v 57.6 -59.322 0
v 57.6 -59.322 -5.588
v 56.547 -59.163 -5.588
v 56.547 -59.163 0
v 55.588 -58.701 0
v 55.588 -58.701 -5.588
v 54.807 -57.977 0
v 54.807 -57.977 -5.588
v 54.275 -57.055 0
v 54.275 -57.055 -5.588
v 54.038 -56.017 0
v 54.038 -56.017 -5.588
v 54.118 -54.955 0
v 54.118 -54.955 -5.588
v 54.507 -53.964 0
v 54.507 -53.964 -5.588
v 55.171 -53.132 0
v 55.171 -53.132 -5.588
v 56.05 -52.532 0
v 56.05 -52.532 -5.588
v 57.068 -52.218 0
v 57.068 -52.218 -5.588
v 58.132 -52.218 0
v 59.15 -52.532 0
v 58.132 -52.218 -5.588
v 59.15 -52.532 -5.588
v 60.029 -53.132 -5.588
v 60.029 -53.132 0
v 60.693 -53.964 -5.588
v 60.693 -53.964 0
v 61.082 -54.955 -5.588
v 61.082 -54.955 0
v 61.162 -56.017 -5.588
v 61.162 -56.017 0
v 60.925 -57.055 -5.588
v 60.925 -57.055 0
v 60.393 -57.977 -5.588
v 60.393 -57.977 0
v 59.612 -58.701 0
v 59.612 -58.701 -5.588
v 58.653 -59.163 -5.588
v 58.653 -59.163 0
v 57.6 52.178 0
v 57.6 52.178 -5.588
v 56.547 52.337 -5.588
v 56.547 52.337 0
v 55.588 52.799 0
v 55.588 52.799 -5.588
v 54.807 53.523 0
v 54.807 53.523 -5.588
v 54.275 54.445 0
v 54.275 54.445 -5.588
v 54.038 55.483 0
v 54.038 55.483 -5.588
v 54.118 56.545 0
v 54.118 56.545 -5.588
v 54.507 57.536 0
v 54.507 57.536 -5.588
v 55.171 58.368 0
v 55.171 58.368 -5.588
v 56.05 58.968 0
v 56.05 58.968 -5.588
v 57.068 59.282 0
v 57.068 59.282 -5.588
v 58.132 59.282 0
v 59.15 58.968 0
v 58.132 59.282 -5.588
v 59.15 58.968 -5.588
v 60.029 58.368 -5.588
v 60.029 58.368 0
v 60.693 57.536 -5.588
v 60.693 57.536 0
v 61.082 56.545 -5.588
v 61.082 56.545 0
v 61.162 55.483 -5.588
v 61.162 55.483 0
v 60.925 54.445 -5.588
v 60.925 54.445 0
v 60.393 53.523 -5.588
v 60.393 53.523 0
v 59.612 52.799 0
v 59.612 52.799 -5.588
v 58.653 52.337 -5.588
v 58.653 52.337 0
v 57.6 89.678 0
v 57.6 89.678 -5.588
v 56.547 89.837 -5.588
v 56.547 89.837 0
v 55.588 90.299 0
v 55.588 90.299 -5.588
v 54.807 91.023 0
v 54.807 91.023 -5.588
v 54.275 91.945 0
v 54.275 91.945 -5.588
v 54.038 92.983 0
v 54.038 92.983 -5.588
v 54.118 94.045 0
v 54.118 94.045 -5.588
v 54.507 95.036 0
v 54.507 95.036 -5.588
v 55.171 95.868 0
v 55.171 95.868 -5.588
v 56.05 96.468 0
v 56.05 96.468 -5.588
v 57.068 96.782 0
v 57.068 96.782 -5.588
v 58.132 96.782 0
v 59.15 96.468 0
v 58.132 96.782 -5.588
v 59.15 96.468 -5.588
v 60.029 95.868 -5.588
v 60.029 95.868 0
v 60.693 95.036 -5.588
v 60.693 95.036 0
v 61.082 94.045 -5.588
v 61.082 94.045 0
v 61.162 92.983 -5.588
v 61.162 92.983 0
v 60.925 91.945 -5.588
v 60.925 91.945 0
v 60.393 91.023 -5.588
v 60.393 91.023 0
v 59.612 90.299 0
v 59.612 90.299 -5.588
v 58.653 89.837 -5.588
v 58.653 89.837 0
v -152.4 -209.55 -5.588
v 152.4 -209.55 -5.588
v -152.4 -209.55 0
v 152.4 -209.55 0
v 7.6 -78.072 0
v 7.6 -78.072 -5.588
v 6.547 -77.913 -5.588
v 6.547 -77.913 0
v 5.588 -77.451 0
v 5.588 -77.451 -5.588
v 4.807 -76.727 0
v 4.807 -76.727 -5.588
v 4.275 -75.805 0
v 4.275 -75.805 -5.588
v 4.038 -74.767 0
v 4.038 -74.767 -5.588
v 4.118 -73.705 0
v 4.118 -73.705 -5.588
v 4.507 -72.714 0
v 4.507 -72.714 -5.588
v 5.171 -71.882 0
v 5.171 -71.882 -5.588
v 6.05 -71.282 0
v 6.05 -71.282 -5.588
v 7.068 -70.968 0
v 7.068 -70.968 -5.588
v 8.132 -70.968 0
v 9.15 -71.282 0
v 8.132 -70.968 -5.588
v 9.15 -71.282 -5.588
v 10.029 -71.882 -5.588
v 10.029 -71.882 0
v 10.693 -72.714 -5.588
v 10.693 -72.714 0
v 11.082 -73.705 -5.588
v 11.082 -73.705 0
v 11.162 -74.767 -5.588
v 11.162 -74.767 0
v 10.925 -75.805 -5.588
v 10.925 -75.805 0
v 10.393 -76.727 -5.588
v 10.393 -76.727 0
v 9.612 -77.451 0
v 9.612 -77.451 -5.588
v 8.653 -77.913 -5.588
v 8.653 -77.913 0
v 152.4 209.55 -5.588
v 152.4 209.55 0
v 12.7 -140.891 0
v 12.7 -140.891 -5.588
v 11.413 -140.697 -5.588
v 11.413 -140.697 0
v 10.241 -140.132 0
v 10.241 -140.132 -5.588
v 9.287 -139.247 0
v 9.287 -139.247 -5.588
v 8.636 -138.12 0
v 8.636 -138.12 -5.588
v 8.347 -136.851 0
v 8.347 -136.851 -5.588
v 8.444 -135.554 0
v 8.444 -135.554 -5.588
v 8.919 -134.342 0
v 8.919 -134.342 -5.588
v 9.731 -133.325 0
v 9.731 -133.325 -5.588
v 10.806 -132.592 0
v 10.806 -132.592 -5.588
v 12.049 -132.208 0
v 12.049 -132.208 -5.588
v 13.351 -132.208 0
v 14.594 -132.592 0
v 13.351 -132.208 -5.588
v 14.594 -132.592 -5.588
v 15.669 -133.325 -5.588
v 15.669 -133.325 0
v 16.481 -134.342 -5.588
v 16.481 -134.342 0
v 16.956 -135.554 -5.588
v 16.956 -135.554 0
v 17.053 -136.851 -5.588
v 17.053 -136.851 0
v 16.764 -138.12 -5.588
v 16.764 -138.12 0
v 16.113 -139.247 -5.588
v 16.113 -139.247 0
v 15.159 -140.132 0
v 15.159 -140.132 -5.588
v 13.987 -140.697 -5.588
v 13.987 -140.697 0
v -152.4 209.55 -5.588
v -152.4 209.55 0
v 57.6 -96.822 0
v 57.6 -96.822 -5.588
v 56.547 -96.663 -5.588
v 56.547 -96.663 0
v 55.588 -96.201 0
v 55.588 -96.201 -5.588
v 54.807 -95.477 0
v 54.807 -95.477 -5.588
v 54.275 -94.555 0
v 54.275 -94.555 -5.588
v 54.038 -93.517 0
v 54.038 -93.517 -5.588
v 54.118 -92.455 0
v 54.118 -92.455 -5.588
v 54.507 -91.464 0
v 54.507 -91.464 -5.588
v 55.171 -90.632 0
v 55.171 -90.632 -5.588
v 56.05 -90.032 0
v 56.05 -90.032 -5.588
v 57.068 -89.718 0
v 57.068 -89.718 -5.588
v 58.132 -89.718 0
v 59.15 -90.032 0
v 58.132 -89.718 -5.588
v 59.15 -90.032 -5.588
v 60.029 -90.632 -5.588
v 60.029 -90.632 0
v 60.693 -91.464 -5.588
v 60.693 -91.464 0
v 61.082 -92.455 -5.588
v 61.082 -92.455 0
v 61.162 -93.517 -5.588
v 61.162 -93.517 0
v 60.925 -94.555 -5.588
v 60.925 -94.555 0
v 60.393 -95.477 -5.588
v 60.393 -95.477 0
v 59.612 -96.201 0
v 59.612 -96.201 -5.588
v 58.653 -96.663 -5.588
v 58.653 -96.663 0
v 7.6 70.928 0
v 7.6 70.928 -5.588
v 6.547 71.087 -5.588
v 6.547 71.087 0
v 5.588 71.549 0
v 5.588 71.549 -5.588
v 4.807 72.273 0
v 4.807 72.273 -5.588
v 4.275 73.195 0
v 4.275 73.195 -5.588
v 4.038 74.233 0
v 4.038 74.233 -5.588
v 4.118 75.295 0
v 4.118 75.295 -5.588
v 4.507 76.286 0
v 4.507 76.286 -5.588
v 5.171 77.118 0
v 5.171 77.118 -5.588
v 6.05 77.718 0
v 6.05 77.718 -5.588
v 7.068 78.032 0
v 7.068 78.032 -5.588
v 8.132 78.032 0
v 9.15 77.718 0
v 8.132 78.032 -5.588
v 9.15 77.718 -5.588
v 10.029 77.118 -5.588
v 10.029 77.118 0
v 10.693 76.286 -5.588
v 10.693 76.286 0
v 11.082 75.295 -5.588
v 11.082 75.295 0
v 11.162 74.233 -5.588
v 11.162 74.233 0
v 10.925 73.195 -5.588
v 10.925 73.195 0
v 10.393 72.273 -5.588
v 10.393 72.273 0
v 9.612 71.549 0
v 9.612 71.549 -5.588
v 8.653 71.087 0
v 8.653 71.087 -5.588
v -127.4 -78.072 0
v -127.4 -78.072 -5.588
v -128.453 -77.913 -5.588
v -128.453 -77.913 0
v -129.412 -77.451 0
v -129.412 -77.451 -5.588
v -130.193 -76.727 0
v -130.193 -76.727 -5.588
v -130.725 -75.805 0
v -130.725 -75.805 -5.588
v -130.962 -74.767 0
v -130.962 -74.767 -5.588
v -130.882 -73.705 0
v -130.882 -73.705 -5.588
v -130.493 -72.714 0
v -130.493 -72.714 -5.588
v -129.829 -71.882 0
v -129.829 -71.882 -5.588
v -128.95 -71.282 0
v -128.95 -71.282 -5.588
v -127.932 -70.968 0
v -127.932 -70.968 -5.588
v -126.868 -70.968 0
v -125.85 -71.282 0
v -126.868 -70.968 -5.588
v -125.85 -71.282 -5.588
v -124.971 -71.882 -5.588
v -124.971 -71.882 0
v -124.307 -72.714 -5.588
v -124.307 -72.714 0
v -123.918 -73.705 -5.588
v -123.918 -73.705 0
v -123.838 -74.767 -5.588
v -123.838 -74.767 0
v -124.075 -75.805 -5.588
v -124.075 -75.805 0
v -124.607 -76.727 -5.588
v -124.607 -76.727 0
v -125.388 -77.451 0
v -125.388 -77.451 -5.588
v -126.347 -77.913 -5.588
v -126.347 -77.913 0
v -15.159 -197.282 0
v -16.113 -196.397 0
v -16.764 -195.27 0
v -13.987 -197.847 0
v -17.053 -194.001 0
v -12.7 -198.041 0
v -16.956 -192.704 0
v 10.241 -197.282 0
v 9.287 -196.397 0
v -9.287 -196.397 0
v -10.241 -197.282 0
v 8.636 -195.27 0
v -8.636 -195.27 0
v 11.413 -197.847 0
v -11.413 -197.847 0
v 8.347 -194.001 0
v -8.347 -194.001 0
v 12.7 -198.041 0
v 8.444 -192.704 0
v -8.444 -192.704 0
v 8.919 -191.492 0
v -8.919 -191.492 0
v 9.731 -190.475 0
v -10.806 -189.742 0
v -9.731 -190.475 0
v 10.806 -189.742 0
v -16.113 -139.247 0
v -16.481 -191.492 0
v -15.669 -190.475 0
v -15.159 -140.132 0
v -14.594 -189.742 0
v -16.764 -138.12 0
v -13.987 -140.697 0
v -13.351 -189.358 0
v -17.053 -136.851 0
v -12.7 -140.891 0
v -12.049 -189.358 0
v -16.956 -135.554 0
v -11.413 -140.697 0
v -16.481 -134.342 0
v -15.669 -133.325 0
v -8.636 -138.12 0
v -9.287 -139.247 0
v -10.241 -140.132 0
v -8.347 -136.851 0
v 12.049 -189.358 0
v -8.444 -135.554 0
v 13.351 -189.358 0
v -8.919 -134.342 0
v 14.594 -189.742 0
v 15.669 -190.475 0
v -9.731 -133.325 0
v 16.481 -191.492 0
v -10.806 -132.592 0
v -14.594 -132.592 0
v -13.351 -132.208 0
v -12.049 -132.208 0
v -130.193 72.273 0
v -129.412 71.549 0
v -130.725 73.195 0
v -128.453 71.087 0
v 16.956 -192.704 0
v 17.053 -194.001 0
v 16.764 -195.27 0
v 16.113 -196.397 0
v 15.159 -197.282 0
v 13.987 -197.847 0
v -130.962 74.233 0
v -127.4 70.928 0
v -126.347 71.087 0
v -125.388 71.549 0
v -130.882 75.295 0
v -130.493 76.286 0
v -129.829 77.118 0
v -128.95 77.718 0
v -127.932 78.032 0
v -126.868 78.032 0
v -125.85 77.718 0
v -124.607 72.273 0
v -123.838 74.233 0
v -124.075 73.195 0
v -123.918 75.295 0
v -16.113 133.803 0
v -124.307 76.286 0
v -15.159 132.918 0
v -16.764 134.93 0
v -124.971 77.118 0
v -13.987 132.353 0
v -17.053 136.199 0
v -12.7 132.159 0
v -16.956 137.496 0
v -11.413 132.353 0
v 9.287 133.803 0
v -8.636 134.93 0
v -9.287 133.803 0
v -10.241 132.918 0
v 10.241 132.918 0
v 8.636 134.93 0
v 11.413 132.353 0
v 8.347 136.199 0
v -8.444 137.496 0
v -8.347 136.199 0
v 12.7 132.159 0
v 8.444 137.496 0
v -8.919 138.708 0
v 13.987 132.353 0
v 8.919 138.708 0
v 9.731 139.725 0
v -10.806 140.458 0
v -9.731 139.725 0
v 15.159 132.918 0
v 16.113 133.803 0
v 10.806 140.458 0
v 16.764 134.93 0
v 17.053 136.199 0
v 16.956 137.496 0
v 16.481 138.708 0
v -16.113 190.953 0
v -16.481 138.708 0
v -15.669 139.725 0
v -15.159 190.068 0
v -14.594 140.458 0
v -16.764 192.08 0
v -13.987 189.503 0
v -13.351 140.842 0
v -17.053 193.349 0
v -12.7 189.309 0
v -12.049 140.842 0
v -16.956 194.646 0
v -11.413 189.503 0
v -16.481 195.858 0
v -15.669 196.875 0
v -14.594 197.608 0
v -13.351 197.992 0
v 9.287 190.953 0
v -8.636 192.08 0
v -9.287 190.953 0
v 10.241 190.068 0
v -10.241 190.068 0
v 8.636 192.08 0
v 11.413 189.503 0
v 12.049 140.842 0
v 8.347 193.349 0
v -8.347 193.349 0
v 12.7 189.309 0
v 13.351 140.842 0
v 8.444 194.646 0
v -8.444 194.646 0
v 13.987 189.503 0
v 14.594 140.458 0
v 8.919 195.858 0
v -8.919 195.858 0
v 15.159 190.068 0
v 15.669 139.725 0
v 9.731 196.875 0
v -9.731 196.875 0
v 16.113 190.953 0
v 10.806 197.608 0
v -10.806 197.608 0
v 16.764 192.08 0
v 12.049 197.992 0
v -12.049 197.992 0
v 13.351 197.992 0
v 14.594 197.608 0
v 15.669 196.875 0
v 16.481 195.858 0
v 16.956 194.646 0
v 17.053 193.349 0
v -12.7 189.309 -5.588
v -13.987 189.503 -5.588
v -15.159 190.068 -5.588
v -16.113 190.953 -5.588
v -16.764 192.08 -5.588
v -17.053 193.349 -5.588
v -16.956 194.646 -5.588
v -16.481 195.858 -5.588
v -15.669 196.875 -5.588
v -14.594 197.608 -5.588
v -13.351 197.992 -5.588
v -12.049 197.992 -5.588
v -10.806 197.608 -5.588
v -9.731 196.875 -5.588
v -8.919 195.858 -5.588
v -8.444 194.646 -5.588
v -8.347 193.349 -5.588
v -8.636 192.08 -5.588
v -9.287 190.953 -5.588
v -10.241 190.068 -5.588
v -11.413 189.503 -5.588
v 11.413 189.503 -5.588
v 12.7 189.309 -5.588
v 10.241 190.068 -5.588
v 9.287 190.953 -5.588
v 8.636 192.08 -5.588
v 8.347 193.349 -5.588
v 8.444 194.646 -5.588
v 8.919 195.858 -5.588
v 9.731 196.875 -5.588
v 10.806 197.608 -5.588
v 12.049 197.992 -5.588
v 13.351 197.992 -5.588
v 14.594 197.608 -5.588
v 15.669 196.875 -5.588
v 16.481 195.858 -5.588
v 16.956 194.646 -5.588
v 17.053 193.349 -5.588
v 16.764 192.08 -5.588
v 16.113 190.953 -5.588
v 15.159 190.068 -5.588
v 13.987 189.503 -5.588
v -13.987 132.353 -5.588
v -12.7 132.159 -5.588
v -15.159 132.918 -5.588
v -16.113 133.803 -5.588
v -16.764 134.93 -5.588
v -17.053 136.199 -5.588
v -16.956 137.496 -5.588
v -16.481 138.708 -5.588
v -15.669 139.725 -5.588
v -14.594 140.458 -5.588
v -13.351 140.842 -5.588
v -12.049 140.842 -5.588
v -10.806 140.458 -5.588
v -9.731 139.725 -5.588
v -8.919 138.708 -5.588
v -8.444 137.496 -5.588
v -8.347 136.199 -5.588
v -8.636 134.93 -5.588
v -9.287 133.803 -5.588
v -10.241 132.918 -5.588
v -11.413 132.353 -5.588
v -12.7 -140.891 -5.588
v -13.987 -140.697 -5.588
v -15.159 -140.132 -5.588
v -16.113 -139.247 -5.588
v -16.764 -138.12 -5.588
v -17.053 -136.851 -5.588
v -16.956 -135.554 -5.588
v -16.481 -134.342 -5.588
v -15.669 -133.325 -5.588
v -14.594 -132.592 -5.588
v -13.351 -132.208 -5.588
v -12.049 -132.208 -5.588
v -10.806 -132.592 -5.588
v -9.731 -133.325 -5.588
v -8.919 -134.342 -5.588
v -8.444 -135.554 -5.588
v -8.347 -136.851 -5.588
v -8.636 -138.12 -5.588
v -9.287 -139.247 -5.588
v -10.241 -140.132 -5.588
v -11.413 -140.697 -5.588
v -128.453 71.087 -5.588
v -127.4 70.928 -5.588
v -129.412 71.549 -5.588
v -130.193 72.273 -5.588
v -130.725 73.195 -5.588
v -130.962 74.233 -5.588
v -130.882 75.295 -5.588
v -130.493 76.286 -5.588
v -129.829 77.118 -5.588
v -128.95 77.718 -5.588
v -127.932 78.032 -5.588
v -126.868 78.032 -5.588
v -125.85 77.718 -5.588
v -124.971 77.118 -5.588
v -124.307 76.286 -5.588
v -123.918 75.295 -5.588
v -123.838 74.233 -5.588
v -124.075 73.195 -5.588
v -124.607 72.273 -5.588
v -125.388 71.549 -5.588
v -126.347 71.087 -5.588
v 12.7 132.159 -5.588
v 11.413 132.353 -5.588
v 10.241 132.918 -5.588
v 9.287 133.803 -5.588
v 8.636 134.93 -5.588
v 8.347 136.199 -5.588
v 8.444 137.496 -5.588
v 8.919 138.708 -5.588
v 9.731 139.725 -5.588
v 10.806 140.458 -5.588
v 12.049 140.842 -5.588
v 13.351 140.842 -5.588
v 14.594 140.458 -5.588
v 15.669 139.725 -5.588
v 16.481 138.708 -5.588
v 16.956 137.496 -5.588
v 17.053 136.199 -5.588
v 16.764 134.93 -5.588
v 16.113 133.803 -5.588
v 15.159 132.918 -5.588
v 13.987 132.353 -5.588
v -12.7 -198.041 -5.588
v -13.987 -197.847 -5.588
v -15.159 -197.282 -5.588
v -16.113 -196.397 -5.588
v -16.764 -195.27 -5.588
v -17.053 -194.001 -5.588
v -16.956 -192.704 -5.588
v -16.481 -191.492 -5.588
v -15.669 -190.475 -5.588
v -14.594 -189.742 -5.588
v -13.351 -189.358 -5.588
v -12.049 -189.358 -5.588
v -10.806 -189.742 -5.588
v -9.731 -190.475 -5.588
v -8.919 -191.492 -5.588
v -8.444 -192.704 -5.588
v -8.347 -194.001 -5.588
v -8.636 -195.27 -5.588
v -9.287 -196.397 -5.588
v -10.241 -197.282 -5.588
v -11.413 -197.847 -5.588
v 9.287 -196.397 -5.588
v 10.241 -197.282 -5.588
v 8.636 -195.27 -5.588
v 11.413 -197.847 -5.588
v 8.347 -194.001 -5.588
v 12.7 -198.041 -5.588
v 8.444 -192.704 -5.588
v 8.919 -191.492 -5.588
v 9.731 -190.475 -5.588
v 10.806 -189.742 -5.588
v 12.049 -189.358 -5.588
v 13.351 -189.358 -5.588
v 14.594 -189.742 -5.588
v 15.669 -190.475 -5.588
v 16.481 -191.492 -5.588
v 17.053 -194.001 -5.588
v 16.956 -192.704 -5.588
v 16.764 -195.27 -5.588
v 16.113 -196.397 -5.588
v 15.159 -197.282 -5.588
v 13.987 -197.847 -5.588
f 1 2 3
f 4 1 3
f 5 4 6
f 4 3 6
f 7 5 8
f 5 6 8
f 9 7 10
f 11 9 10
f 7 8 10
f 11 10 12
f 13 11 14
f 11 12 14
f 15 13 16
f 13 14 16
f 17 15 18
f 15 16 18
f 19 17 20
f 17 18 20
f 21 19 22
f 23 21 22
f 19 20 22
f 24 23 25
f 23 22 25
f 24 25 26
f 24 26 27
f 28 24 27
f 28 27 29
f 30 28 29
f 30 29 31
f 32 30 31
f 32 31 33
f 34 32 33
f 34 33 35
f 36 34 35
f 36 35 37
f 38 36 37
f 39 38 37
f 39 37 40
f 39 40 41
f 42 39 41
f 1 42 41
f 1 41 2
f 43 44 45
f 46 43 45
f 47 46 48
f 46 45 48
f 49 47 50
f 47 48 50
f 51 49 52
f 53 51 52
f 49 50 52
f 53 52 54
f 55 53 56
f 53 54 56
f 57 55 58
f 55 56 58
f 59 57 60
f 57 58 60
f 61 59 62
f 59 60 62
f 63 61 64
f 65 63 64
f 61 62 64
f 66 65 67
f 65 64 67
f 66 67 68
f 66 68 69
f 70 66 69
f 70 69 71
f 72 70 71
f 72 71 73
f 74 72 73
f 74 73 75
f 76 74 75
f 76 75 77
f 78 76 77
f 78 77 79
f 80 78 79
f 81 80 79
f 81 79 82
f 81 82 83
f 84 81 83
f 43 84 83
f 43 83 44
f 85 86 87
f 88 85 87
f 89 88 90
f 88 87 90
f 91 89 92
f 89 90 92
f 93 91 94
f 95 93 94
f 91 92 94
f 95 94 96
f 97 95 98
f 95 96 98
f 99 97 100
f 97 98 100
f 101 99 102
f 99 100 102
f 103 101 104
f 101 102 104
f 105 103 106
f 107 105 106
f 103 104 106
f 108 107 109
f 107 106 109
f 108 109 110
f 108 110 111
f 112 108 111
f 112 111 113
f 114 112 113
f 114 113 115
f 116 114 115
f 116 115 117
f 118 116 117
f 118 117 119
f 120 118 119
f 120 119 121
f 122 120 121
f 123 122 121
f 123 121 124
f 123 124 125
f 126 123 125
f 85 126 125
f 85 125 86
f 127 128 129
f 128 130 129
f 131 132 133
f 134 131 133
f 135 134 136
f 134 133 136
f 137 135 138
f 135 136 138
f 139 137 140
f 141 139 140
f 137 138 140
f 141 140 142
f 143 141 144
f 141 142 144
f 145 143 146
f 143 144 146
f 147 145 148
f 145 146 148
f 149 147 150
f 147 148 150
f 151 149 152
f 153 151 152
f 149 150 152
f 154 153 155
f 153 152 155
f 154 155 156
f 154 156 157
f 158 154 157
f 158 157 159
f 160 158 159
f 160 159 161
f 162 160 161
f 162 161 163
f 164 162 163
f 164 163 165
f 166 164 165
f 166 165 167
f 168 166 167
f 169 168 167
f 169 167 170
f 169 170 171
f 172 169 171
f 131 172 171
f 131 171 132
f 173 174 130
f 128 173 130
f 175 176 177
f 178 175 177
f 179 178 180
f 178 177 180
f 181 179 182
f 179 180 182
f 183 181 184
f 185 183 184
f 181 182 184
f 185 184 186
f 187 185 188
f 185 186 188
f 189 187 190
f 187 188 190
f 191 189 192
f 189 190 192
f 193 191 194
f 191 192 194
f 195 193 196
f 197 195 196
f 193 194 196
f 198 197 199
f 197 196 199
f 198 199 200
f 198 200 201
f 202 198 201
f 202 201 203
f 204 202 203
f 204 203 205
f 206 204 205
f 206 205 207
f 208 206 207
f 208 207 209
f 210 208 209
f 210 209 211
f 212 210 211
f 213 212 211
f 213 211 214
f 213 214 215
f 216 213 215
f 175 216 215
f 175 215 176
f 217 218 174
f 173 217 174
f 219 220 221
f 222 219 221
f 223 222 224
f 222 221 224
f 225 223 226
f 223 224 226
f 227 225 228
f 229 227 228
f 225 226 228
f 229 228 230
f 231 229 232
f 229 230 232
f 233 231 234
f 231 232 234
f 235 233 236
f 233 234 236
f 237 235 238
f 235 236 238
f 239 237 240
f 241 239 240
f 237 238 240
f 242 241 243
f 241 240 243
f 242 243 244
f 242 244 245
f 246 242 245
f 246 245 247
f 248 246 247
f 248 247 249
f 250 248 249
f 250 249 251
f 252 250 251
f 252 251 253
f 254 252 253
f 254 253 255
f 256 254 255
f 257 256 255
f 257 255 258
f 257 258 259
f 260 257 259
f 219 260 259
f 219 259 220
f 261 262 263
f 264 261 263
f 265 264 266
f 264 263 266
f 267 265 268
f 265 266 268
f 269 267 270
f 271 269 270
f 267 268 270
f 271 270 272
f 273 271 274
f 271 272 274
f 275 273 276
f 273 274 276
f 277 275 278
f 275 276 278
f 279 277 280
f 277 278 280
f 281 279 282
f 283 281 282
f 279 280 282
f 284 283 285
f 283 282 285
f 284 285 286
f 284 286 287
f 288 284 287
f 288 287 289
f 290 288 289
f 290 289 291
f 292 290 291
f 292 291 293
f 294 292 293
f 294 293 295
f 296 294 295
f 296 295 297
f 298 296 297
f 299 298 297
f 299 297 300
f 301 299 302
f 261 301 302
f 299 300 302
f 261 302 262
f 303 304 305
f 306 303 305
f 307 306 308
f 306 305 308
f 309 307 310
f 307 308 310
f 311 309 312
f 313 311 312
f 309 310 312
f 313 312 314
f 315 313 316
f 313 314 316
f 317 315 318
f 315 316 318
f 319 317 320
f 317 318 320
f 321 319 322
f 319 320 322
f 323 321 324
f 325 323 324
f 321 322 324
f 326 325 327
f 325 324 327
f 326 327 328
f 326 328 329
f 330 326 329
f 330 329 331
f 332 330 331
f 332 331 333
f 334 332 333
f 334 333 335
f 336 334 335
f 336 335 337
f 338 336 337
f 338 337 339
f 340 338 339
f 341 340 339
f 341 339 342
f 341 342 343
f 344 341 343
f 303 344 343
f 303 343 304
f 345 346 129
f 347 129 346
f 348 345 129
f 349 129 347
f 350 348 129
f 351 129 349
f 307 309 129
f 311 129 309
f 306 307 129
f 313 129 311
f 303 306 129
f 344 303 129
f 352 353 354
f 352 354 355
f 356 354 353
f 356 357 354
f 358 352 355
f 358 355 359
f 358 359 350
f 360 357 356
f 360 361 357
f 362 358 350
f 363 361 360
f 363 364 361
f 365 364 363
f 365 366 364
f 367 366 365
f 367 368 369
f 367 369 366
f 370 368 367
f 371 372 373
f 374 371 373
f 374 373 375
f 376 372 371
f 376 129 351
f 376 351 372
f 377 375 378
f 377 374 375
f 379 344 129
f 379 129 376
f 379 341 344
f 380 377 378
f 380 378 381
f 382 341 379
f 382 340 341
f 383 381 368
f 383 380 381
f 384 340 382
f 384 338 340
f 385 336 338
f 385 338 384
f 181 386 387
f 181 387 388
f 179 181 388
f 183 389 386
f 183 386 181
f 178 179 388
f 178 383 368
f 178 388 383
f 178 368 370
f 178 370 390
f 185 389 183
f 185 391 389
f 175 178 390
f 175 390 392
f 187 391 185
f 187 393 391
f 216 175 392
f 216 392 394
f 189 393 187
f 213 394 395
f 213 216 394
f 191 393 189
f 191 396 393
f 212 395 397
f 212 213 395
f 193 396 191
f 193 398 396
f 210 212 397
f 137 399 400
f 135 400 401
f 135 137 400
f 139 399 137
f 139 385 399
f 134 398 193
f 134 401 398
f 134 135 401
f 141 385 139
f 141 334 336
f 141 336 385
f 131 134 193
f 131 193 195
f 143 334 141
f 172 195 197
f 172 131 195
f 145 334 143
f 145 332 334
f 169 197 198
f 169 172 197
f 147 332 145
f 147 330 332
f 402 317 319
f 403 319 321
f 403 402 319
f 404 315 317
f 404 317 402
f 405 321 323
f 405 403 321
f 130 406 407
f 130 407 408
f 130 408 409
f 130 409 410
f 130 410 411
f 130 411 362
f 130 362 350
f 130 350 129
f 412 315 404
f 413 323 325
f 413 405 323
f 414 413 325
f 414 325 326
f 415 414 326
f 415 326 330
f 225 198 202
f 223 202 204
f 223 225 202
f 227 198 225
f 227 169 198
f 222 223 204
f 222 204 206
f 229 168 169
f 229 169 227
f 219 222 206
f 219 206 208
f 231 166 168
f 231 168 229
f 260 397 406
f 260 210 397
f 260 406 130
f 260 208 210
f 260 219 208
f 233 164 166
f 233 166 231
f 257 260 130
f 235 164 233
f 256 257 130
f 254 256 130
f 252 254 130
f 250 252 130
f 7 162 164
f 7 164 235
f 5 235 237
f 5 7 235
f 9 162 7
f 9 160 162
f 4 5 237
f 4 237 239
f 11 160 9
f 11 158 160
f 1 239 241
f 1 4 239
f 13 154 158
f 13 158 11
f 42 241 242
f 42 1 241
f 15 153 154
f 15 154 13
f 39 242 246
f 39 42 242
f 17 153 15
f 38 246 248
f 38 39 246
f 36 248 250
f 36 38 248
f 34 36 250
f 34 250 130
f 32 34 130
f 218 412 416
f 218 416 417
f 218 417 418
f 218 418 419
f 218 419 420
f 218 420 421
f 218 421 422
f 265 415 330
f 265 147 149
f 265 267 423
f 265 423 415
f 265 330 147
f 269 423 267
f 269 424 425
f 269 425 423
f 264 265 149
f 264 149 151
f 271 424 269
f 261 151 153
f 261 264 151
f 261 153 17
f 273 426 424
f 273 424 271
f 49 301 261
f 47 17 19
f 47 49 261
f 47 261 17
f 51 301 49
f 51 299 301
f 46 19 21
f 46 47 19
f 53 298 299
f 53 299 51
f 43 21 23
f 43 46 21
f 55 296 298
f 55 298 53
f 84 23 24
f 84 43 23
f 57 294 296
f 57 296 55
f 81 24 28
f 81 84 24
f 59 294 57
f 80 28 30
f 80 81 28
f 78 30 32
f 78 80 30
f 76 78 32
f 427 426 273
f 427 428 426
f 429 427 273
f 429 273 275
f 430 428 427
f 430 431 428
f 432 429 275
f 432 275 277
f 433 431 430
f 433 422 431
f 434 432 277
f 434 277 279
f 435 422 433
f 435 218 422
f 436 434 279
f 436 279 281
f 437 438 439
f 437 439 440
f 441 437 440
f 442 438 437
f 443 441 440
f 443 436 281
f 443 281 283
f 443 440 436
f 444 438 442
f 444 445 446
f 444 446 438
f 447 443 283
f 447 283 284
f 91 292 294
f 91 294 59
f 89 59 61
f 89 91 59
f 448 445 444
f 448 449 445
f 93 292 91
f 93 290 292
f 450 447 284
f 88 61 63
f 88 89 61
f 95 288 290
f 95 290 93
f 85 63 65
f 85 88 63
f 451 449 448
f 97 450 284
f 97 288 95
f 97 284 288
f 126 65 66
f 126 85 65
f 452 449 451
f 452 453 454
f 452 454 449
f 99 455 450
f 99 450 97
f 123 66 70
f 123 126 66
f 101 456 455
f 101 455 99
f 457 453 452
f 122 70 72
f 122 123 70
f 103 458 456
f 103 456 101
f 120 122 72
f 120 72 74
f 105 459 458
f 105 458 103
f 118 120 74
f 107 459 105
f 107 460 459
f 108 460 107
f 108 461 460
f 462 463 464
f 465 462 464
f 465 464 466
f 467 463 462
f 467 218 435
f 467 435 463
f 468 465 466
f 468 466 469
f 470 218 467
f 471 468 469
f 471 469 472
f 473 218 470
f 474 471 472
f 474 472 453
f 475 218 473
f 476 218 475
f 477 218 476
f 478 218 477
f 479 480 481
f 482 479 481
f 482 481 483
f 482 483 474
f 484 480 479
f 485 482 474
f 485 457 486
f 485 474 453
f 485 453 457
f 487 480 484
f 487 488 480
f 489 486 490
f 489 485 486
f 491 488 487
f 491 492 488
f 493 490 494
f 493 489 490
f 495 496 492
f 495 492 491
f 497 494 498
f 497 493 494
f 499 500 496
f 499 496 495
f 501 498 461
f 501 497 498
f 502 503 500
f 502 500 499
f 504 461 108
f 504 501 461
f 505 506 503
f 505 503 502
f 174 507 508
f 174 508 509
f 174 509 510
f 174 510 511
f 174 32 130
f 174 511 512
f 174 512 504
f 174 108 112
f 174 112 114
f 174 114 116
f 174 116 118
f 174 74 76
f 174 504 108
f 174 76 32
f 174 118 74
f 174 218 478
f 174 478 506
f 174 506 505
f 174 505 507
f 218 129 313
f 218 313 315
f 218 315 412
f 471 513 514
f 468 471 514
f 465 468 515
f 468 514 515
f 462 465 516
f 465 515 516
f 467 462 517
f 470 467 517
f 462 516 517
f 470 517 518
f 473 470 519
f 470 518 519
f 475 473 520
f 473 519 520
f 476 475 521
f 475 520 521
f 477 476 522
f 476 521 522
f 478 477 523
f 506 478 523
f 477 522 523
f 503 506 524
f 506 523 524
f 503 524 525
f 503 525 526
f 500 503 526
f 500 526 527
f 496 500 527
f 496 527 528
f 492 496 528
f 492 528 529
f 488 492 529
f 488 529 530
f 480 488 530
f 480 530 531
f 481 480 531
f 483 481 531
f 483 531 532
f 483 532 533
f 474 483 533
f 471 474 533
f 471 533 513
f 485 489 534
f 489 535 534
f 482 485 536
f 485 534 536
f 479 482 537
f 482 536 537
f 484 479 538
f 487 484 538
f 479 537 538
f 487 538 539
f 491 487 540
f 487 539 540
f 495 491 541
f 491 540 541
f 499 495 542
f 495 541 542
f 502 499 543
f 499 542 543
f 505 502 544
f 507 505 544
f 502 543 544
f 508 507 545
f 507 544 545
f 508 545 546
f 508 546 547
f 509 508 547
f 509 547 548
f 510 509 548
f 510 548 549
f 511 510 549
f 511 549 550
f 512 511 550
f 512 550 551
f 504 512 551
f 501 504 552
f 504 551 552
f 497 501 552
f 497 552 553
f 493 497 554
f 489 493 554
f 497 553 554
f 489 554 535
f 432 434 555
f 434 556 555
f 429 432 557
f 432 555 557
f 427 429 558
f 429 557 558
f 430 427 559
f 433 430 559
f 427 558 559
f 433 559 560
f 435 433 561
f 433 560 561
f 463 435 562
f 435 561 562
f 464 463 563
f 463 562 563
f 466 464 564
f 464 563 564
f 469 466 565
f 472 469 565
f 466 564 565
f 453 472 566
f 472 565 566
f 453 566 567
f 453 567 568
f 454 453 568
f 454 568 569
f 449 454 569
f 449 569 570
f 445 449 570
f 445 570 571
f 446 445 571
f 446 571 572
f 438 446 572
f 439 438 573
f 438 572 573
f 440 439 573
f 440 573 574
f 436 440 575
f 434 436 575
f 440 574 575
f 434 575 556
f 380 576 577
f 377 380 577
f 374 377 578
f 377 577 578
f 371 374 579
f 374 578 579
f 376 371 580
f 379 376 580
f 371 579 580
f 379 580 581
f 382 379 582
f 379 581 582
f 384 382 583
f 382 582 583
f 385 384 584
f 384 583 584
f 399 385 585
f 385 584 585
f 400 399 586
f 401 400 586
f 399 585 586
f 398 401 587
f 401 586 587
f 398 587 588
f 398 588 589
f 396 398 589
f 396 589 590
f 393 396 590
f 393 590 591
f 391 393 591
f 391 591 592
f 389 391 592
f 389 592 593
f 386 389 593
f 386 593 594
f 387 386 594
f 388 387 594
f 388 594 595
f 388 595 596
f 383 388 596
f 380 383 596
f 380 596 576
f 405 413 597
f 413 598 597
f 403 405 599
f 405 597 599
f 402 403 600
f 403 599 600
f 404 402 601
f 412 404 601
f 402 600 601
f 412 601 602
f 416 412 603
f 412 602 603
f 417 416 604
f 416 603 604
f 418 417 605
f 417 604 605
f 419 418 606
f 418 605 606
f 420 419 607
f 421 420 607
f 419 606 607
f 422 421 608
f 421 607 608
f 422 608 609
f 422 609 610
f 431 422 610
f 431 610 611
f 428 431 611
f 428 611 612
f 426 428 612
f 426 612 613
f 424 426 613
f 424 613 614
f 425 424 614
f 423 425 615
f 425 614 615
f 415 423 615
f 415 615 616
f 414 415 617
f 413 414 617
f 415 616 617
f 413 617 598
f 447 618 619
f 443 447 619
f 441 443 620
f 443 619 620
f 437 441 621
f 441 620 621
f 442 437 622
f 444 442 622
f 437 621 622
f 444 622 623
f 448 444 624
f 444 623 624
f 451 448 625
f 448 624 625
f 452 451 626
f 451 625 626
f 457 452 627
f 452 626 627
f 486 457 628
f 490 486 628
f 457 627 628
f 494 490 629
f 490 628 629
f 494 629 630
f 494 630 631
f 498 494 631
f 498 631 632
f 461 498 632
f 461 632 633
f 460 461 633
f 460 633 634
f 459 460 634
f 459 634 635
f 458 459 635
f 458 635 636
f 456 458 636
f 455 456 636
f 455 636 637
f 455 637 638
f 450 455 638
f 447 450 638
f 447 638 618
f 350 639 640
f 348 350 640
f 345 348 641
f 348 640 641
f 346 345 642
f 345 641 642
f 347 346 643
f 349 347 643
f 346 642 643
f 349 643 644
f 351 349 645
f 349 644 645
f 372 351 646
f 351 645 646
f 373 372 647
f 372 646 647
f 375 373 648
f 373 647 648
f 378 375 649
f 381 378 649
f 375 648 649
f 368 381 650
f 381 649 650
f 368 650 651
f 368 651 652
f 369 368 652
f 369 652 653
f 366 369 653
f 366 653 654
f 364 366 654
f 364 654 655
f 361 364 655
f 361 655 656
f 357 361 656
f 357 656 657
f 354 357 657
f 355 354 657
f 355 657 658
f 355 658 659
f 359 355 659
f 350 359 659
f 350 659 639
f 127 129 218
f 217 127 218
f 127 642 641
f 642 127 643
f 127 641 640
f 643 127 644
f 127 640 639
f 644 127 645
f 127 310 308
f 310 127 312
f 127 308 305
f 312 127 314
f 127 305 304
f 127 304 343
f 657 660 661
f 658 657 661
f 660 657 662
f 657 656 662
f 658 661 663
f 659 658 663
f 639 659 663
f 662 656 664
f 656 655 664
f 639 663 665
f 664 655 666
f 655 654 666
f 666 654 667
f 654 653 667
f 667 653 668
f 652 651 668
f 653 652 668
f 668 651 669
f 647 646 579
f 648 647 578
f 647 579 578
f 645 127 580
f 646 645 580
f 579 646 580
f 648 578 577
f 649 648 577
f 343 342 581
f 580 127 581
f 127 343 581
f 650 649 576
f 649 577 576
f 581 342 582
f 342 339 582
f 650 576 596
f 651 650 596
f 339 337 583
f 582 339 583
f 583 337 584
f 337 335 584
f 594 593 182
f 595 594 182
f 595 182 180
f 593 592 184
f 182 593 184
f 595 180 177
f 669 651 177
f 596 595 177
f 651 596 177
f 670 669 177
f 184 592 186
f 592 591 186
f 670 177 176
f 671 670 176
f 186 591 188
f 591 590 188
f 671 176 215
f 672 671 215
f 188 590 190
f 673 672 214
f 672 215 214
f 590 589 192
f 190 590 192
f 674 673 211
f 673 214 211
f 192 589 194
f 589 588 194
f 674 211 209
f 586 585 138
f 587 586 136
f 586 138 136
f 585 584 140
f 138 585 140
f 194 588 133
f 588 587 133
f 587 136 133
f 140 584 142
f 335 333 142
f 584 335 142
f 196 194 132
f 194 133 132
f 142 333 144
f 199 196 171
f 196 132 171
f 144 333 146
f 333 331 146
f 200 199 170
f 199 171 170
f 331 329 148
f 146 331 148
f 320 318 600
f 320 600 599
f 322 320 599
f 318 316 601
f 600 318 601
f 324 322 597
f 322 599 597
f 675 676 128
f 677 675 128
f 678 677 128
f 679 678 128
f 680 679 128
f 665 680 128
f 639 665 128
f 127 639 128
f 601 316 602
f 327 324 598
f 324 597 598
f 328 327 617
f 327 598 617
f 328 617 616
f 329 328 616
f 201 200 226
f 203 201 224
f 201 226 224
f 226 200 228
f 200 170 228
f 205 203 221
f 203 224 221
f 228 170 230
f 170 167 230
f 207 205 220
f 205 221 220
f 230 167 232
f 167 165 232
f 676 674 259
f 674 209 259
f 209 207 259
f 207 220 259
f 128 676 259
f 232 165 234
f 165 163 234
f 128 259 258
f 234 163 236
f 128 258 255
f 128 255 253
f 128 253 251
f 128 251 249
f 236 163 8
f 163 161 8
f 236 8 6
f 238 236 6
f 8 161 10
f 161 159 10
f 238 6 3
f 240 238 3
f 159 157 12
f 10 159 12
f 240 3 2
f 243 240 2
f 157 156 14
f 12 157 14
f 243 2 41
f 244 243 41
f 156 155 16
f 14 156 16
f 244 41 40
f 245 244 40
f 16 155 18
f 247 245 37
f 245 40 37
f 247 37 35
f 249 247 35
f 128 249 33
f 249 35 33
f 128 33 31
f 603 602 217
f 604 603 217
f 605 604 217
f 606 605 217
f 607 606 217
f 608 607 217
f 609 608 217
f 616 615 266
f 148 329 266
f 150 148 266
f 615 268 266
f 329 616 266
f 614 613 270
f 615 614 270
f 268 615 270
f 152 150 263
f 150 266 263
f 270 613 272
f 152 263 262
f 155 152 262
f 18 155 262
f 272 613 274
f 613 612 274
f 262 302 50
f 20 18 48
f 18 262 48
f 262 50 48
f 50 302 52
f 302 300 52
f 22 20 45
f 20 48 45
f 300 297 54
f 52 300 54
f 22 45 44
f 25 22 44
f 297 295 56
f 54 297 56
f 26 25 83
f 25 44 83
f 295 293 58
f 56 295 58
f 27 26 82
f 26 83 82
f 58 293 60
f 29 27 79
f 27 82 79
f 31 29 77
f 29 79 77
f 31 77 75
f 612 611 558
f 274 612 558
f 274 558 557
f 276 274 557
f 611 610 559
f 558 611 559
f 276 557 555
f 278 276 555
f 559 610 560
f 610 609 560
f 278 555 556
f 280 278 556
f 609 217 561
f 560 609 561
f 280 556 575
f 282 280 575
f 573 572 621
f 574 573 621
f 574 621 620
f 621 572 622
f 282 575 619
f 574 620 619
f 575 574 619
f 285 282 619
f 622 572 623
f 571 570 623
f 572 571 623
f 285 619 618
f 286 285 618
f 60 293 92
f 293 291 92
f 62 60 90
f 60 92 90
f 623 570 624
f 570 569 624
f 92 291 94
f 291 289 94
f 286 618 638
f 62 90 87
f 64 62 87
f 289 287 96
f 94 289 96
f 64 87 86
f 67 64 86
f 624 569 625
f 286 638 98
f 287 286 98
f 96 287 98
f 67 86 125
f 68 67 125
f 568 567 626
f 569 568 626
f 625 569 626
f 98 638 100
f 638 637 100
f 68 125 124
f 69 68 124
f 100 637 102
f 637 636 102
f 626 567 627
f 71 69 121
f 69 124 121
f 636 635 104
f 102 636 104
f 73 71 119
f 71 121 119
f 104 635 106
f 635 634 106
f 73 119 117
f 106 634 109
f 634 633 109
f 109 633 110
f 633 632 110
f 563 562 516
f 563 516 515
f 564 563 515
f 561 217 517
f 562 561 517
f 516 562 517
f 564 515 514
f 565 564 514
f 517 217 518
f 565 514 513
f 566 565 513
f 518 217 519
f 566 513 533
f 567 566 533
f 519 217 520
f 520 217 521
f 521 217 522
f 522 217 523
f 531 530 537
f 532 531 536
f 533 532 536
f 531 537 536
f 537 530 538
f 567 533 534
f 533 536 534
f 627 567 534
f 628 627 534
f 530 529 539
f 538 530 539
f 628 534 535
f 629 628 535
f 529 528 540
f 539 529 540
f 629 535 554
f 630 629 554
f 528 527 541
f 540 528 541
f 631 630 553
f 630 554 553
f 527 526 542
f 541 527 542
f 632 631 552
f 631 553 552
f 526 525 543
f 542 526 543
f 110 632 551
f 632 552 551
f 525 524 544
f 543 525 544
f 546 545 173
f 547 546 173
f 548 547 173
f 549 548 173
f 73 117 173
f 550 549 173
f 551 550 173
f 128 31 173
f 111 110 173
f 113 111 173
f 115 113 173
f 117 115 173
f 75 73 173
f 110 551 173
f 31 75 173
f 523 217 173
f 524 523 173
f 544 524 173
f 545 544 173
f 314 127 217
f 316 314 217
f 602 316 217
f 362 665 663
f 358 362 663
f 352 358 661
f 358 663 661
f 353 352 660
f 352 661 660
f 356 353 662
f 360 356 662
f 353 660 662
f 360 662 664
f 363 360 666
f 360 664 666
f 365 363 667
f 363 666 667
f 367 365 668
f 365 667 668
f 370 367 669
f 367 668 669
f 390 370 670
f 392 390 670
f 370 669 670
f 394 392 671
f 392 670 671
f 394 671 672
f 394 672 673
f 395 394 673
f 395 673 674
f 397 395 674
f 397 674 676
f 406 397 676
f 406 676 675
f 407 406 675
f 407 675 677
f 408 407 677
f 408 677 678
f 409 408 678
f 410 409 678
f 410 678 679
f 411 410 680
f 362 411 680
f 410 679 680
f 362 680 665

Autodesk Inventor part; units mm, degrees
ref_plane "YZ Plane" through (0, 0, 0) normal (1, 0, 0) x (0, 1, 0)
ref_plane "XZ Plane" through (0, 0, 0) normal (0, 1, 0) x (-1, 0, 0)
ref_plane "XY Plane" through (0, 0, 0) normal (0, 0, 1) x (1, 0, 0)
sketch "Sketch1" plane through (0, 0, 0) normal (0, 0, 1) x (1, 0, 0)
  line L0 (152.4, -209.55) -> (-152.4, -209.55)
  line L1 (-152.4, -209.55) -> (-152.4, 209.55)
  line L2 (-152.4, 209.55) -> (152.4, 209.55)
  line L3 (152.4, 209.55) -> (152.4, -209.55)
  line L4 (152.4, -209.55) -> (-152.4, 209.55) construction
  line L5 (-152.4, -209.55) -> (152.4, 209.55) construction
  line L6 (57.6, 93.25) -> (57.6, -93.25) construction
  point P0 (0, 0)
  point P1 (57.6, 55.75)
  point P2 (57.6, -55.75)
  point P3 (57.6, 0)
  point P4 (152.4, 0)
  dimension "d0" = 304.8
  dimension "d1" = 419.1
  dimension "d2" = 111.5
  dimension "d3" = 37.5
  dimension "d4" = 37.5
  dimension "d25" = 210
extrude "Extrusion1" add sketch "Sketch1" against normal blind 5.588
hole "Hole1" at (57.6, 55.75, 0) at (57.6, -55.75, 0) at (57.6, -93.25, 0) at (57.6, 93.25, 0) direction (0, 0, -1) diameter 7.1437 end through all
sketch "Sketch2" plane through (0, 0, 0) normal (0, 0, 1) x (1, 0, 0)
  line L0 (-127.4, 74.5) -> (7.6, 74.5) construction
  line L1 (-127.4, -74.5) -> (7.6, -74.5) construction
  circle A0 centre (57.6, 55.75) radius 3.5719 construction
  circle A1 centre (57.6, -55.75) radius 3.5719 projected
  circle A2 centre (57.6, 93.25) radius 3.5719 construction
  line L2 (57.6, 93.25) -> (57.6, 55.75) construction
  circle A3 centre (57.6, -93.25) radius 3.5719 construction
  line L3 (57.6, -93.25) -> (57.6, -55.75) construction
  point P0 (0, 0)
  point P1 (57.6, -74.5)
  point P2 (57.6, 74.5)
  dimension "d15" = 50
  dimension "d16" = 50
  dimension "d17" = 135
hole "Hole2" at (-127.4, 74.5, 0) at (7.6, 74.5, 0) at (7.6, -74.5, 0) at (-127.4, -74.5, 0) direction (0, 0, -1) diameter 7.1437 end through all
sketch "Sketch3" plane through (0, 0, 0) normal (0, 0, 1) x (1, 0, 0)
  line L0 (12.7, -193.675) -> (-12.7, -193.675) construction
  line L1 (-12.7, -193.675) -> (-12.7, -136.525) construction
  line L2 (-12.7, -136.525) -> (12.7, -136.525) construction
  line L3 (12.7, -136.525) -> (12.7, -193.675) construction
  line L4 (12.7, -193.675) -> (-12.7, -136.525) construction
  line L5 (-12.7, -193.675) -> (12.7, -136.525) construction
  line L6 (-12.7, 136.525) -> (12.7, 136.525) construction
  line L7 (12.7, 136.525) -> (12.7, 193.675) construction
  line L8 (12.7, 193.675) -> (-12.7, 193.675) construction
  line L9 (-12.7, 193.675) -> (-12.7, 136.525) construction
  line L10 (-12.7, 136.525) -> (12.7, 193.675) construction
  line L11 (12.7, 136.525) -> (-12.7, 193.675) construction
  line L12 (-23.8125, -202.4062) -> (23.8125, -202.4062) construction
  line L13 (23.8125, -202.4062) -> (23.8125, -127.7938) construction
  line L14 (23.8125, -127.7938) -> (-23.8125, -127.7938) construction
  line L15 (-23.8125, -127.7938) -> (-23.8125, -202.4062) construction
  line L16 (-23.8125, -202.4062) -> (23.8125, -127.7938) construction
  line L17 (23.8125, -202.4062) -> (-23.8125, -127.7938) construction
  line L18 (-23.8125, 127.7938) -> (23.8125, 127.7938) construction
  line L19 (23.8125, 127.7938) -> (23.8125, 202.4062) construction
  line L20 (23.8125, 202.4062) -> (-23.8125, 202.4062) construction
  line L21 (-23.8125, 202.4062) -> (-23.8125, 127.7938) construction
  line L22 (-23.8125, 127.7938) -> (23.8125, 202.4062) construction
  line L23 (23.8125, 127.7938) -> (-23.8125, 202.4062) construction
  line L24 (0, -165.1) -> (0, 165.1) construction
  line L25 (-152.4, -209.55) -> (152.4, -209.55) construction
  point P0 (0, 0)
  point P1 (0, 0)
  dimension "d26" = 25.4
  dimension "d27" = 57.15
  dimension "d28" = 25.4
  dimension "d29" = 57.15
  dimension "d30" = 47.625
  dimension "d31" = 74.6125
  dimension "d33" = 330.2
hole "Hole3" at (12.7, 193.675, 0) at (12.7, 136.525, 0) at (-12.7, 136.525, 0) at (-12.7, 193.675, 0) at (12.7, -136.525, 0) at (12.7, -193.675, 0) at (-12.7, -193.675, 0) at (-12.7, -136.525, 0) direction (0, 0, -1) diameter 8.7313 end through all
equation "\"d16\" = d15"
properties part number "Base Plate" material "Polycarbonate, Clear"
